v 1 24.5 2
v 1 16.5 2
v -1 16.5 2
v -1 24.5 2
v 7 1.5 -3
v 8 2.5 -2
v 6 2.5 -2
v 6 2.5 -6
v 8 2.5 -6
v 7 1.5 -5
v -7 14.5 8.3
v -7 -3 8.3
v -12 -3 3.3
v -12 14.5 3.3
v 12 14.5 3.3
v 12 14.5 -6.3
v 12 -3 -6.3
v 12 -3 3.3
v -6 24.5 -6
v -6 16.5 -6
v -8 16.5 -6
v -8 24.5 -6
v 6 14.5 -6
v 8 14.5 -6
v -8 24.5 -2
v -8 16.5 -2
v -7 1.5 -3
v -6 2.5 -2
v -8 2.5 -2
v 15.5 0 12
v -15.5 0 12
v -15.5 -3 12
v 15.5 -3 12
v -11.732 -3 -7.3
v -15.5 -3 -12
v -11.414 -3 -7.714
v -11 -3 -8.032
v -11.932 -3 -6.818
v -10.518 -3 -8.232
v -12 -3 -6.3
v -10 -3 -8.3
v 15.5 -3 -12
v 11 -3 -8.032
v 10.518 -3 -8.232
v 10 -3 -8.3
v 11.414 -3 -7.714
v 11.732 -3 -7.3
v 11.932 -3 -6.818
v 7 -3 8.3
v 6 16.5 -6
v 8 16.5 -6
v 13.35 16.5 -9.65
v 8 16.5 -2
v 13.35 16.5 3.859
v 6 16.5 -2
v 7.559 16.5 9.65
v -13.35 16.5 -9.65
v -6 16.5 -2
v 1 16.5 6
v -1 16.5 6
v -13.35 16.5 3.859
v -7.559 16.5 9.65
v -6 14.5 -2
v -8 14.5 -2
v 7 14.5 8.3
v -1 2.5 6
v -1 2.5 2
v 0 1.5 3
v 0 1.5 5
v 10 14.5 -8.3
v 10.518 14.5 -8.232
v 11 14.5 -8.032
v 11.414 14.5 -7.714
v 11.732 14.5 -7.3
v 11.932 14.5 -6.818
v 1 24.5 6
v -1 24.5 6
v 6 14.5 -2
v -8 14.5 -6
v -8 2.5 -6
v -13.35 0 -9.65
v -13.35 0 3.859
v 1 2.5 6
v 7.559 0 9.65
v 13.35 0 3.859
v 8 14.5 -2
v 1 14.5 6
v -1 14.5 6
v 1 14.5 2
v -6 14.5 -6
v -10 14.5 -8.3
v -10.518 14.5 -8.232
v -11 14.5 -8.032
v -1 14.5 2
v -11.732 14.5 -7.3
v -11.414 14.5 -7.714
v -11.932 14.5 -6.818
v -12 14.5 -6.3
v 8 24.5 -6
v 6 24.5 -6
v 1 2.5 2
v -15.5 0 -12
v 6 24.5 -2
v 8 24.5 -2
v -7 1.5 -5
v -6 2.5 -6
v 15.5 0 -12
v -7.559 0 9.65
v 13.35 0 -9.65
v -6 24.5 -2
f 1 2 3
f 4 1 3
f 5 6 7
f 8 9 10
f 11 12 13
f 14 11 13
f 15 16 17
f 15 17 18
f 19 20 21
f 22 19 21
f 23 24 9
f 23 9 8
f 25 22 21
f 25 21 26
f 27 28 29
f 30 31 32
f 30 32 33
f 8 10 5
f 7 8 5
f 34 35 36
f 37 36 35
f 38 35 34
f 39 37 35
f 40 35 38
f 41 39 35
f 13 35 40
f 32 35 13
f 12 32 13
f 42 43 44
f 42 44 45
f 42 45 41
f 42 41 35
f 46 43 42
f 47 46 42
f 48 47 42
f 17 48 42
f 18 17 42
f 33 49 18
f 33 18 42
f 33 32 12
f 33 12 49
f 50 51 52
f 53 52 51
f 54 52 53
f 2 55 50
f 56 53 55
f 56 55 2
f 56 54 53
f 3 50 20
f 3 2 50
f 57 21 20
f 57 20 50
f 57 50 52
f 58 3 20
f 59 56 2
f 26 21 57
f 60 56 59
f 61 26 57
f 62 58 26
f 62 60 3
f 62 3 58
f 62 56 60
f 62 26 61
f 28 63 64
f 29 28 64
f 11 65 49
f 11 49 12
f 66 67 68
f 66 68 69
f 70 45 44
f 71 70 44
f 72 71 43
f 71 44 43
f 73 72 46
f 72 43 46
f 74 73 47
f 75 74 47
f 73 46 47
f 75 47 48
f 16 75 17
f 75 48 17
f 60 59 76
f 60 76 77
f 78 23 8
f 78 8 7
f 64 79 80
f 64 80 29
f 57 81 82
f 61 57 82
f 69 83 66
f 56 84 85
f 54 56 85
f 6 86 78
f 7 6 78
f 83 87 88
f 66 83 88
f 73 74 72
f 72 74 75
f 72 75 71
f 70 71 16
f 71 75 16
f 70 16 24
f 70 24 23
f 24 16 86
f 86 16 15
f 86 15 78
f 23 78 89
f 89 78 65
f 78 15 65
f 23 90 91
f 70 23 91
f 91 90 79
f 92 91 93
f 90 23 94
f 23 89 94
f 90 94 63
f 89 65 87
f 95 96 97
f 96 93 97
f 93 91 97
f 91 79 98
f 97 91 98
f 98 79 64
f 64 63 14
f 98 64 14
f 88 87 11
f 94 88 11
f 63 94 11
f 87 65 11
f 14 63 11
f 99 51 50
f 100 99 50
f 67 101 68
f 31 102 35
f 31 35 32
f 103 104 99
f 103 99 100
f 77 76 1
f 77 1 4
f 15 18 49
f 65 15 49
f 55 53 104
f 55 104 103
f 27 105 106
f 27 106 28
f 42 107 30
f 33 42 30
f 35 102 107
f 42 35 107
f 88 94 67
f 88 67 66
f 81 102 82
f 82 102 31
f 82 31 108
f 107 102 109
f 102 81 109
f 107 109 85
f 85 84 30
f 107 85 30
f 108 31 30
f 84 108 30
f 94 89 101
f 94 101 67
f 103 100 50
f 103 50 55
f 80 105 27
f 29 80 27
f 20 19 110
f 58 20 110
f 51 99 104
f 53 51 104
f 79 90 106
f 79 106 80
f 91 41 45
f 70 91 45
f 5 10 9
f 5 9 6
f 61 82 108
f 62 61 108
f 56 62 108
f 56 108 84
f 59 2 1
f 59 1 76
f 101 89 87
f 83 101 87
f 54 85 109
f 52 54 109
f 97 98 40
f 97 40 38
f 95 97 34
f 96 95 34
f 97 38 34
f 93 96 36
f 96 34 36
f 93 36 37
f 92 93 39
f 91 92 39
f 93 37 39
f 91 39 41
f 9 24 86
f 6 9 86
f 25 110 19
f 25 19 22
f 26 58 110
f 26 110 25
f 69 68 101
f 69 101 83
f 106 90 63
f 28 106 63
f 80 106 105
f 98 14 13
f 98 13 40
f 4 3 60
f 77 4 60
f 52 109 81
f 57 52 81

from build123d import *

# Parameters (mm, degrees)
F0_W          = 31
F0_H          = 24
F1_DEPTH      = 3
F3_DEPTH      = 16.5
F5_DEPTH      = 2
F6_W          = 2
F6_H          = 4
F7_DEPTH      = 8
F7_DEPTH_BACK = 15
F8_SIZE       = 0.99999


# Not quite as in the source:
# - a fillet or chamfer is up to 0.001 mm smaller than in the source, because OpenCascade refuses the exact size


with BuildPart() as f1:
    # F0 (on Front) → F1 (new body)
    with BuildSketch(Plane.XZ):
        Rectangle(F0_W, F0_H)
        with BuildLine():
            Line((10, -8.3), (-10, -8.3))
            ThreePointArc((-10, -8.3), (-11.4142135624, -7.7142135624), (-12, -6.3))
            Line((-12, -6.3), (-12, 3.3))
            Line((-12, 3.3), (-7, 8.3))
            Line((-7, 8.3), (7, 8.3))
            Line((7, 8.3), (12, 3.3))
            Line((12, 3.3), (12, -6.3))
            ThreePointArc((12, -6.3), (11.4142135624, -7.7142135624), (10, -8.3))
        make_face(mode=Mode.SUBTRACT)
    extrude(amount=F1_DEPTH)

    # F2 (on face) → F3 (join)
    with BuildSketch(Plane(origin=(0, 0, 0), x_dir=(-1, 0, 0), z_dir=(0, 1, 0))):
        Polygon((-7.5591883092, 9.65), (-13.35, 3.8591883092), (-13.35, -9.65), (13.35, -9.65), (13.35, 3.8591883092), (7.5591883092, 9.65), align=None)
        with BuildLine():
            Line((-12, -6.3), (-12, 3.3))
            Line((-12, 3.3), (-7, 8.3))
            Line((-7, 8.3), (7, 8.3))
            Line((7, 8.3), (12, 3.3))
            Line((12, 3.3), (12, -6.3))
            ThreePointArc((12, -6.3), (11.4142135624, -7.7142135624), (10, -8.3))
            Line((10, -8.3), (-10, -8.3))
            ThreePointArc((-10, -8.3), (-11.4142135624, -7.7142135624), (-12, -6.3))
        make_face(mode=Mode.SUBTRACT)
    extrude(amount=F3_DEPTH)

    # F4 (on face) → F5 (join)
    with BuildSketch(Plane(origin=(0, 16.5, 0), x_dir=(-1, 0, 0), z_dir=(0, 1, 0))):
        Polygon((7.5591883092, 9.65), (-7.5591883092, 9.65), (-13.35, 3.8591883092), (-13.35, -9.65), (13.35, -9.65), (13.35, 3.8591883092), align=None)
    extrude(amount=-F5_DEPTH)

    # F6 (on face) → F7 (join, two sides)
    with BuildSketch(Plane(origin=(0, 16.5, 0), x_dir=(-1, 0, 0), z_dir=(0, 1, 0))) as f7_sk:
        with Locations((0, 4)):
            Rectangle(F6_W, F6_H)
        with Locations((7, -4)):
            Rectangle(F6_W, F6_H)
        with Locations((-7, -4)):
            Rectangle(F6_W, F6_H)
    extrude(amount=F7_DEPTH)
    extrude(f7_sk.sketch, amount=-F7_DEPTH_BACK)

    # F8 (size 1 in the source; OpenCascade refuses exactly that, so slightly less here)
    f8_edges = [f1.edges().sort_by_distance(p)[0] for p in [
        (0, 1.5, 2),
        (-1, 1.5, 4),
        (0, 1.5, 6),
        (1, 1.5, 4),
        (8, 1.5, -4),
        (7, 1.5, -6),
        (6, 1.5, -4),
        (7, 1.5, -2),
        (-7, 1.5, -6),
        (-8, 1.5, -4),
        (-7, 1.5, -2),
        (-6, 1.5, -4),
    ]]
    chamfer(f8_edges, length=F8_SIZE)


solid = f1.part
